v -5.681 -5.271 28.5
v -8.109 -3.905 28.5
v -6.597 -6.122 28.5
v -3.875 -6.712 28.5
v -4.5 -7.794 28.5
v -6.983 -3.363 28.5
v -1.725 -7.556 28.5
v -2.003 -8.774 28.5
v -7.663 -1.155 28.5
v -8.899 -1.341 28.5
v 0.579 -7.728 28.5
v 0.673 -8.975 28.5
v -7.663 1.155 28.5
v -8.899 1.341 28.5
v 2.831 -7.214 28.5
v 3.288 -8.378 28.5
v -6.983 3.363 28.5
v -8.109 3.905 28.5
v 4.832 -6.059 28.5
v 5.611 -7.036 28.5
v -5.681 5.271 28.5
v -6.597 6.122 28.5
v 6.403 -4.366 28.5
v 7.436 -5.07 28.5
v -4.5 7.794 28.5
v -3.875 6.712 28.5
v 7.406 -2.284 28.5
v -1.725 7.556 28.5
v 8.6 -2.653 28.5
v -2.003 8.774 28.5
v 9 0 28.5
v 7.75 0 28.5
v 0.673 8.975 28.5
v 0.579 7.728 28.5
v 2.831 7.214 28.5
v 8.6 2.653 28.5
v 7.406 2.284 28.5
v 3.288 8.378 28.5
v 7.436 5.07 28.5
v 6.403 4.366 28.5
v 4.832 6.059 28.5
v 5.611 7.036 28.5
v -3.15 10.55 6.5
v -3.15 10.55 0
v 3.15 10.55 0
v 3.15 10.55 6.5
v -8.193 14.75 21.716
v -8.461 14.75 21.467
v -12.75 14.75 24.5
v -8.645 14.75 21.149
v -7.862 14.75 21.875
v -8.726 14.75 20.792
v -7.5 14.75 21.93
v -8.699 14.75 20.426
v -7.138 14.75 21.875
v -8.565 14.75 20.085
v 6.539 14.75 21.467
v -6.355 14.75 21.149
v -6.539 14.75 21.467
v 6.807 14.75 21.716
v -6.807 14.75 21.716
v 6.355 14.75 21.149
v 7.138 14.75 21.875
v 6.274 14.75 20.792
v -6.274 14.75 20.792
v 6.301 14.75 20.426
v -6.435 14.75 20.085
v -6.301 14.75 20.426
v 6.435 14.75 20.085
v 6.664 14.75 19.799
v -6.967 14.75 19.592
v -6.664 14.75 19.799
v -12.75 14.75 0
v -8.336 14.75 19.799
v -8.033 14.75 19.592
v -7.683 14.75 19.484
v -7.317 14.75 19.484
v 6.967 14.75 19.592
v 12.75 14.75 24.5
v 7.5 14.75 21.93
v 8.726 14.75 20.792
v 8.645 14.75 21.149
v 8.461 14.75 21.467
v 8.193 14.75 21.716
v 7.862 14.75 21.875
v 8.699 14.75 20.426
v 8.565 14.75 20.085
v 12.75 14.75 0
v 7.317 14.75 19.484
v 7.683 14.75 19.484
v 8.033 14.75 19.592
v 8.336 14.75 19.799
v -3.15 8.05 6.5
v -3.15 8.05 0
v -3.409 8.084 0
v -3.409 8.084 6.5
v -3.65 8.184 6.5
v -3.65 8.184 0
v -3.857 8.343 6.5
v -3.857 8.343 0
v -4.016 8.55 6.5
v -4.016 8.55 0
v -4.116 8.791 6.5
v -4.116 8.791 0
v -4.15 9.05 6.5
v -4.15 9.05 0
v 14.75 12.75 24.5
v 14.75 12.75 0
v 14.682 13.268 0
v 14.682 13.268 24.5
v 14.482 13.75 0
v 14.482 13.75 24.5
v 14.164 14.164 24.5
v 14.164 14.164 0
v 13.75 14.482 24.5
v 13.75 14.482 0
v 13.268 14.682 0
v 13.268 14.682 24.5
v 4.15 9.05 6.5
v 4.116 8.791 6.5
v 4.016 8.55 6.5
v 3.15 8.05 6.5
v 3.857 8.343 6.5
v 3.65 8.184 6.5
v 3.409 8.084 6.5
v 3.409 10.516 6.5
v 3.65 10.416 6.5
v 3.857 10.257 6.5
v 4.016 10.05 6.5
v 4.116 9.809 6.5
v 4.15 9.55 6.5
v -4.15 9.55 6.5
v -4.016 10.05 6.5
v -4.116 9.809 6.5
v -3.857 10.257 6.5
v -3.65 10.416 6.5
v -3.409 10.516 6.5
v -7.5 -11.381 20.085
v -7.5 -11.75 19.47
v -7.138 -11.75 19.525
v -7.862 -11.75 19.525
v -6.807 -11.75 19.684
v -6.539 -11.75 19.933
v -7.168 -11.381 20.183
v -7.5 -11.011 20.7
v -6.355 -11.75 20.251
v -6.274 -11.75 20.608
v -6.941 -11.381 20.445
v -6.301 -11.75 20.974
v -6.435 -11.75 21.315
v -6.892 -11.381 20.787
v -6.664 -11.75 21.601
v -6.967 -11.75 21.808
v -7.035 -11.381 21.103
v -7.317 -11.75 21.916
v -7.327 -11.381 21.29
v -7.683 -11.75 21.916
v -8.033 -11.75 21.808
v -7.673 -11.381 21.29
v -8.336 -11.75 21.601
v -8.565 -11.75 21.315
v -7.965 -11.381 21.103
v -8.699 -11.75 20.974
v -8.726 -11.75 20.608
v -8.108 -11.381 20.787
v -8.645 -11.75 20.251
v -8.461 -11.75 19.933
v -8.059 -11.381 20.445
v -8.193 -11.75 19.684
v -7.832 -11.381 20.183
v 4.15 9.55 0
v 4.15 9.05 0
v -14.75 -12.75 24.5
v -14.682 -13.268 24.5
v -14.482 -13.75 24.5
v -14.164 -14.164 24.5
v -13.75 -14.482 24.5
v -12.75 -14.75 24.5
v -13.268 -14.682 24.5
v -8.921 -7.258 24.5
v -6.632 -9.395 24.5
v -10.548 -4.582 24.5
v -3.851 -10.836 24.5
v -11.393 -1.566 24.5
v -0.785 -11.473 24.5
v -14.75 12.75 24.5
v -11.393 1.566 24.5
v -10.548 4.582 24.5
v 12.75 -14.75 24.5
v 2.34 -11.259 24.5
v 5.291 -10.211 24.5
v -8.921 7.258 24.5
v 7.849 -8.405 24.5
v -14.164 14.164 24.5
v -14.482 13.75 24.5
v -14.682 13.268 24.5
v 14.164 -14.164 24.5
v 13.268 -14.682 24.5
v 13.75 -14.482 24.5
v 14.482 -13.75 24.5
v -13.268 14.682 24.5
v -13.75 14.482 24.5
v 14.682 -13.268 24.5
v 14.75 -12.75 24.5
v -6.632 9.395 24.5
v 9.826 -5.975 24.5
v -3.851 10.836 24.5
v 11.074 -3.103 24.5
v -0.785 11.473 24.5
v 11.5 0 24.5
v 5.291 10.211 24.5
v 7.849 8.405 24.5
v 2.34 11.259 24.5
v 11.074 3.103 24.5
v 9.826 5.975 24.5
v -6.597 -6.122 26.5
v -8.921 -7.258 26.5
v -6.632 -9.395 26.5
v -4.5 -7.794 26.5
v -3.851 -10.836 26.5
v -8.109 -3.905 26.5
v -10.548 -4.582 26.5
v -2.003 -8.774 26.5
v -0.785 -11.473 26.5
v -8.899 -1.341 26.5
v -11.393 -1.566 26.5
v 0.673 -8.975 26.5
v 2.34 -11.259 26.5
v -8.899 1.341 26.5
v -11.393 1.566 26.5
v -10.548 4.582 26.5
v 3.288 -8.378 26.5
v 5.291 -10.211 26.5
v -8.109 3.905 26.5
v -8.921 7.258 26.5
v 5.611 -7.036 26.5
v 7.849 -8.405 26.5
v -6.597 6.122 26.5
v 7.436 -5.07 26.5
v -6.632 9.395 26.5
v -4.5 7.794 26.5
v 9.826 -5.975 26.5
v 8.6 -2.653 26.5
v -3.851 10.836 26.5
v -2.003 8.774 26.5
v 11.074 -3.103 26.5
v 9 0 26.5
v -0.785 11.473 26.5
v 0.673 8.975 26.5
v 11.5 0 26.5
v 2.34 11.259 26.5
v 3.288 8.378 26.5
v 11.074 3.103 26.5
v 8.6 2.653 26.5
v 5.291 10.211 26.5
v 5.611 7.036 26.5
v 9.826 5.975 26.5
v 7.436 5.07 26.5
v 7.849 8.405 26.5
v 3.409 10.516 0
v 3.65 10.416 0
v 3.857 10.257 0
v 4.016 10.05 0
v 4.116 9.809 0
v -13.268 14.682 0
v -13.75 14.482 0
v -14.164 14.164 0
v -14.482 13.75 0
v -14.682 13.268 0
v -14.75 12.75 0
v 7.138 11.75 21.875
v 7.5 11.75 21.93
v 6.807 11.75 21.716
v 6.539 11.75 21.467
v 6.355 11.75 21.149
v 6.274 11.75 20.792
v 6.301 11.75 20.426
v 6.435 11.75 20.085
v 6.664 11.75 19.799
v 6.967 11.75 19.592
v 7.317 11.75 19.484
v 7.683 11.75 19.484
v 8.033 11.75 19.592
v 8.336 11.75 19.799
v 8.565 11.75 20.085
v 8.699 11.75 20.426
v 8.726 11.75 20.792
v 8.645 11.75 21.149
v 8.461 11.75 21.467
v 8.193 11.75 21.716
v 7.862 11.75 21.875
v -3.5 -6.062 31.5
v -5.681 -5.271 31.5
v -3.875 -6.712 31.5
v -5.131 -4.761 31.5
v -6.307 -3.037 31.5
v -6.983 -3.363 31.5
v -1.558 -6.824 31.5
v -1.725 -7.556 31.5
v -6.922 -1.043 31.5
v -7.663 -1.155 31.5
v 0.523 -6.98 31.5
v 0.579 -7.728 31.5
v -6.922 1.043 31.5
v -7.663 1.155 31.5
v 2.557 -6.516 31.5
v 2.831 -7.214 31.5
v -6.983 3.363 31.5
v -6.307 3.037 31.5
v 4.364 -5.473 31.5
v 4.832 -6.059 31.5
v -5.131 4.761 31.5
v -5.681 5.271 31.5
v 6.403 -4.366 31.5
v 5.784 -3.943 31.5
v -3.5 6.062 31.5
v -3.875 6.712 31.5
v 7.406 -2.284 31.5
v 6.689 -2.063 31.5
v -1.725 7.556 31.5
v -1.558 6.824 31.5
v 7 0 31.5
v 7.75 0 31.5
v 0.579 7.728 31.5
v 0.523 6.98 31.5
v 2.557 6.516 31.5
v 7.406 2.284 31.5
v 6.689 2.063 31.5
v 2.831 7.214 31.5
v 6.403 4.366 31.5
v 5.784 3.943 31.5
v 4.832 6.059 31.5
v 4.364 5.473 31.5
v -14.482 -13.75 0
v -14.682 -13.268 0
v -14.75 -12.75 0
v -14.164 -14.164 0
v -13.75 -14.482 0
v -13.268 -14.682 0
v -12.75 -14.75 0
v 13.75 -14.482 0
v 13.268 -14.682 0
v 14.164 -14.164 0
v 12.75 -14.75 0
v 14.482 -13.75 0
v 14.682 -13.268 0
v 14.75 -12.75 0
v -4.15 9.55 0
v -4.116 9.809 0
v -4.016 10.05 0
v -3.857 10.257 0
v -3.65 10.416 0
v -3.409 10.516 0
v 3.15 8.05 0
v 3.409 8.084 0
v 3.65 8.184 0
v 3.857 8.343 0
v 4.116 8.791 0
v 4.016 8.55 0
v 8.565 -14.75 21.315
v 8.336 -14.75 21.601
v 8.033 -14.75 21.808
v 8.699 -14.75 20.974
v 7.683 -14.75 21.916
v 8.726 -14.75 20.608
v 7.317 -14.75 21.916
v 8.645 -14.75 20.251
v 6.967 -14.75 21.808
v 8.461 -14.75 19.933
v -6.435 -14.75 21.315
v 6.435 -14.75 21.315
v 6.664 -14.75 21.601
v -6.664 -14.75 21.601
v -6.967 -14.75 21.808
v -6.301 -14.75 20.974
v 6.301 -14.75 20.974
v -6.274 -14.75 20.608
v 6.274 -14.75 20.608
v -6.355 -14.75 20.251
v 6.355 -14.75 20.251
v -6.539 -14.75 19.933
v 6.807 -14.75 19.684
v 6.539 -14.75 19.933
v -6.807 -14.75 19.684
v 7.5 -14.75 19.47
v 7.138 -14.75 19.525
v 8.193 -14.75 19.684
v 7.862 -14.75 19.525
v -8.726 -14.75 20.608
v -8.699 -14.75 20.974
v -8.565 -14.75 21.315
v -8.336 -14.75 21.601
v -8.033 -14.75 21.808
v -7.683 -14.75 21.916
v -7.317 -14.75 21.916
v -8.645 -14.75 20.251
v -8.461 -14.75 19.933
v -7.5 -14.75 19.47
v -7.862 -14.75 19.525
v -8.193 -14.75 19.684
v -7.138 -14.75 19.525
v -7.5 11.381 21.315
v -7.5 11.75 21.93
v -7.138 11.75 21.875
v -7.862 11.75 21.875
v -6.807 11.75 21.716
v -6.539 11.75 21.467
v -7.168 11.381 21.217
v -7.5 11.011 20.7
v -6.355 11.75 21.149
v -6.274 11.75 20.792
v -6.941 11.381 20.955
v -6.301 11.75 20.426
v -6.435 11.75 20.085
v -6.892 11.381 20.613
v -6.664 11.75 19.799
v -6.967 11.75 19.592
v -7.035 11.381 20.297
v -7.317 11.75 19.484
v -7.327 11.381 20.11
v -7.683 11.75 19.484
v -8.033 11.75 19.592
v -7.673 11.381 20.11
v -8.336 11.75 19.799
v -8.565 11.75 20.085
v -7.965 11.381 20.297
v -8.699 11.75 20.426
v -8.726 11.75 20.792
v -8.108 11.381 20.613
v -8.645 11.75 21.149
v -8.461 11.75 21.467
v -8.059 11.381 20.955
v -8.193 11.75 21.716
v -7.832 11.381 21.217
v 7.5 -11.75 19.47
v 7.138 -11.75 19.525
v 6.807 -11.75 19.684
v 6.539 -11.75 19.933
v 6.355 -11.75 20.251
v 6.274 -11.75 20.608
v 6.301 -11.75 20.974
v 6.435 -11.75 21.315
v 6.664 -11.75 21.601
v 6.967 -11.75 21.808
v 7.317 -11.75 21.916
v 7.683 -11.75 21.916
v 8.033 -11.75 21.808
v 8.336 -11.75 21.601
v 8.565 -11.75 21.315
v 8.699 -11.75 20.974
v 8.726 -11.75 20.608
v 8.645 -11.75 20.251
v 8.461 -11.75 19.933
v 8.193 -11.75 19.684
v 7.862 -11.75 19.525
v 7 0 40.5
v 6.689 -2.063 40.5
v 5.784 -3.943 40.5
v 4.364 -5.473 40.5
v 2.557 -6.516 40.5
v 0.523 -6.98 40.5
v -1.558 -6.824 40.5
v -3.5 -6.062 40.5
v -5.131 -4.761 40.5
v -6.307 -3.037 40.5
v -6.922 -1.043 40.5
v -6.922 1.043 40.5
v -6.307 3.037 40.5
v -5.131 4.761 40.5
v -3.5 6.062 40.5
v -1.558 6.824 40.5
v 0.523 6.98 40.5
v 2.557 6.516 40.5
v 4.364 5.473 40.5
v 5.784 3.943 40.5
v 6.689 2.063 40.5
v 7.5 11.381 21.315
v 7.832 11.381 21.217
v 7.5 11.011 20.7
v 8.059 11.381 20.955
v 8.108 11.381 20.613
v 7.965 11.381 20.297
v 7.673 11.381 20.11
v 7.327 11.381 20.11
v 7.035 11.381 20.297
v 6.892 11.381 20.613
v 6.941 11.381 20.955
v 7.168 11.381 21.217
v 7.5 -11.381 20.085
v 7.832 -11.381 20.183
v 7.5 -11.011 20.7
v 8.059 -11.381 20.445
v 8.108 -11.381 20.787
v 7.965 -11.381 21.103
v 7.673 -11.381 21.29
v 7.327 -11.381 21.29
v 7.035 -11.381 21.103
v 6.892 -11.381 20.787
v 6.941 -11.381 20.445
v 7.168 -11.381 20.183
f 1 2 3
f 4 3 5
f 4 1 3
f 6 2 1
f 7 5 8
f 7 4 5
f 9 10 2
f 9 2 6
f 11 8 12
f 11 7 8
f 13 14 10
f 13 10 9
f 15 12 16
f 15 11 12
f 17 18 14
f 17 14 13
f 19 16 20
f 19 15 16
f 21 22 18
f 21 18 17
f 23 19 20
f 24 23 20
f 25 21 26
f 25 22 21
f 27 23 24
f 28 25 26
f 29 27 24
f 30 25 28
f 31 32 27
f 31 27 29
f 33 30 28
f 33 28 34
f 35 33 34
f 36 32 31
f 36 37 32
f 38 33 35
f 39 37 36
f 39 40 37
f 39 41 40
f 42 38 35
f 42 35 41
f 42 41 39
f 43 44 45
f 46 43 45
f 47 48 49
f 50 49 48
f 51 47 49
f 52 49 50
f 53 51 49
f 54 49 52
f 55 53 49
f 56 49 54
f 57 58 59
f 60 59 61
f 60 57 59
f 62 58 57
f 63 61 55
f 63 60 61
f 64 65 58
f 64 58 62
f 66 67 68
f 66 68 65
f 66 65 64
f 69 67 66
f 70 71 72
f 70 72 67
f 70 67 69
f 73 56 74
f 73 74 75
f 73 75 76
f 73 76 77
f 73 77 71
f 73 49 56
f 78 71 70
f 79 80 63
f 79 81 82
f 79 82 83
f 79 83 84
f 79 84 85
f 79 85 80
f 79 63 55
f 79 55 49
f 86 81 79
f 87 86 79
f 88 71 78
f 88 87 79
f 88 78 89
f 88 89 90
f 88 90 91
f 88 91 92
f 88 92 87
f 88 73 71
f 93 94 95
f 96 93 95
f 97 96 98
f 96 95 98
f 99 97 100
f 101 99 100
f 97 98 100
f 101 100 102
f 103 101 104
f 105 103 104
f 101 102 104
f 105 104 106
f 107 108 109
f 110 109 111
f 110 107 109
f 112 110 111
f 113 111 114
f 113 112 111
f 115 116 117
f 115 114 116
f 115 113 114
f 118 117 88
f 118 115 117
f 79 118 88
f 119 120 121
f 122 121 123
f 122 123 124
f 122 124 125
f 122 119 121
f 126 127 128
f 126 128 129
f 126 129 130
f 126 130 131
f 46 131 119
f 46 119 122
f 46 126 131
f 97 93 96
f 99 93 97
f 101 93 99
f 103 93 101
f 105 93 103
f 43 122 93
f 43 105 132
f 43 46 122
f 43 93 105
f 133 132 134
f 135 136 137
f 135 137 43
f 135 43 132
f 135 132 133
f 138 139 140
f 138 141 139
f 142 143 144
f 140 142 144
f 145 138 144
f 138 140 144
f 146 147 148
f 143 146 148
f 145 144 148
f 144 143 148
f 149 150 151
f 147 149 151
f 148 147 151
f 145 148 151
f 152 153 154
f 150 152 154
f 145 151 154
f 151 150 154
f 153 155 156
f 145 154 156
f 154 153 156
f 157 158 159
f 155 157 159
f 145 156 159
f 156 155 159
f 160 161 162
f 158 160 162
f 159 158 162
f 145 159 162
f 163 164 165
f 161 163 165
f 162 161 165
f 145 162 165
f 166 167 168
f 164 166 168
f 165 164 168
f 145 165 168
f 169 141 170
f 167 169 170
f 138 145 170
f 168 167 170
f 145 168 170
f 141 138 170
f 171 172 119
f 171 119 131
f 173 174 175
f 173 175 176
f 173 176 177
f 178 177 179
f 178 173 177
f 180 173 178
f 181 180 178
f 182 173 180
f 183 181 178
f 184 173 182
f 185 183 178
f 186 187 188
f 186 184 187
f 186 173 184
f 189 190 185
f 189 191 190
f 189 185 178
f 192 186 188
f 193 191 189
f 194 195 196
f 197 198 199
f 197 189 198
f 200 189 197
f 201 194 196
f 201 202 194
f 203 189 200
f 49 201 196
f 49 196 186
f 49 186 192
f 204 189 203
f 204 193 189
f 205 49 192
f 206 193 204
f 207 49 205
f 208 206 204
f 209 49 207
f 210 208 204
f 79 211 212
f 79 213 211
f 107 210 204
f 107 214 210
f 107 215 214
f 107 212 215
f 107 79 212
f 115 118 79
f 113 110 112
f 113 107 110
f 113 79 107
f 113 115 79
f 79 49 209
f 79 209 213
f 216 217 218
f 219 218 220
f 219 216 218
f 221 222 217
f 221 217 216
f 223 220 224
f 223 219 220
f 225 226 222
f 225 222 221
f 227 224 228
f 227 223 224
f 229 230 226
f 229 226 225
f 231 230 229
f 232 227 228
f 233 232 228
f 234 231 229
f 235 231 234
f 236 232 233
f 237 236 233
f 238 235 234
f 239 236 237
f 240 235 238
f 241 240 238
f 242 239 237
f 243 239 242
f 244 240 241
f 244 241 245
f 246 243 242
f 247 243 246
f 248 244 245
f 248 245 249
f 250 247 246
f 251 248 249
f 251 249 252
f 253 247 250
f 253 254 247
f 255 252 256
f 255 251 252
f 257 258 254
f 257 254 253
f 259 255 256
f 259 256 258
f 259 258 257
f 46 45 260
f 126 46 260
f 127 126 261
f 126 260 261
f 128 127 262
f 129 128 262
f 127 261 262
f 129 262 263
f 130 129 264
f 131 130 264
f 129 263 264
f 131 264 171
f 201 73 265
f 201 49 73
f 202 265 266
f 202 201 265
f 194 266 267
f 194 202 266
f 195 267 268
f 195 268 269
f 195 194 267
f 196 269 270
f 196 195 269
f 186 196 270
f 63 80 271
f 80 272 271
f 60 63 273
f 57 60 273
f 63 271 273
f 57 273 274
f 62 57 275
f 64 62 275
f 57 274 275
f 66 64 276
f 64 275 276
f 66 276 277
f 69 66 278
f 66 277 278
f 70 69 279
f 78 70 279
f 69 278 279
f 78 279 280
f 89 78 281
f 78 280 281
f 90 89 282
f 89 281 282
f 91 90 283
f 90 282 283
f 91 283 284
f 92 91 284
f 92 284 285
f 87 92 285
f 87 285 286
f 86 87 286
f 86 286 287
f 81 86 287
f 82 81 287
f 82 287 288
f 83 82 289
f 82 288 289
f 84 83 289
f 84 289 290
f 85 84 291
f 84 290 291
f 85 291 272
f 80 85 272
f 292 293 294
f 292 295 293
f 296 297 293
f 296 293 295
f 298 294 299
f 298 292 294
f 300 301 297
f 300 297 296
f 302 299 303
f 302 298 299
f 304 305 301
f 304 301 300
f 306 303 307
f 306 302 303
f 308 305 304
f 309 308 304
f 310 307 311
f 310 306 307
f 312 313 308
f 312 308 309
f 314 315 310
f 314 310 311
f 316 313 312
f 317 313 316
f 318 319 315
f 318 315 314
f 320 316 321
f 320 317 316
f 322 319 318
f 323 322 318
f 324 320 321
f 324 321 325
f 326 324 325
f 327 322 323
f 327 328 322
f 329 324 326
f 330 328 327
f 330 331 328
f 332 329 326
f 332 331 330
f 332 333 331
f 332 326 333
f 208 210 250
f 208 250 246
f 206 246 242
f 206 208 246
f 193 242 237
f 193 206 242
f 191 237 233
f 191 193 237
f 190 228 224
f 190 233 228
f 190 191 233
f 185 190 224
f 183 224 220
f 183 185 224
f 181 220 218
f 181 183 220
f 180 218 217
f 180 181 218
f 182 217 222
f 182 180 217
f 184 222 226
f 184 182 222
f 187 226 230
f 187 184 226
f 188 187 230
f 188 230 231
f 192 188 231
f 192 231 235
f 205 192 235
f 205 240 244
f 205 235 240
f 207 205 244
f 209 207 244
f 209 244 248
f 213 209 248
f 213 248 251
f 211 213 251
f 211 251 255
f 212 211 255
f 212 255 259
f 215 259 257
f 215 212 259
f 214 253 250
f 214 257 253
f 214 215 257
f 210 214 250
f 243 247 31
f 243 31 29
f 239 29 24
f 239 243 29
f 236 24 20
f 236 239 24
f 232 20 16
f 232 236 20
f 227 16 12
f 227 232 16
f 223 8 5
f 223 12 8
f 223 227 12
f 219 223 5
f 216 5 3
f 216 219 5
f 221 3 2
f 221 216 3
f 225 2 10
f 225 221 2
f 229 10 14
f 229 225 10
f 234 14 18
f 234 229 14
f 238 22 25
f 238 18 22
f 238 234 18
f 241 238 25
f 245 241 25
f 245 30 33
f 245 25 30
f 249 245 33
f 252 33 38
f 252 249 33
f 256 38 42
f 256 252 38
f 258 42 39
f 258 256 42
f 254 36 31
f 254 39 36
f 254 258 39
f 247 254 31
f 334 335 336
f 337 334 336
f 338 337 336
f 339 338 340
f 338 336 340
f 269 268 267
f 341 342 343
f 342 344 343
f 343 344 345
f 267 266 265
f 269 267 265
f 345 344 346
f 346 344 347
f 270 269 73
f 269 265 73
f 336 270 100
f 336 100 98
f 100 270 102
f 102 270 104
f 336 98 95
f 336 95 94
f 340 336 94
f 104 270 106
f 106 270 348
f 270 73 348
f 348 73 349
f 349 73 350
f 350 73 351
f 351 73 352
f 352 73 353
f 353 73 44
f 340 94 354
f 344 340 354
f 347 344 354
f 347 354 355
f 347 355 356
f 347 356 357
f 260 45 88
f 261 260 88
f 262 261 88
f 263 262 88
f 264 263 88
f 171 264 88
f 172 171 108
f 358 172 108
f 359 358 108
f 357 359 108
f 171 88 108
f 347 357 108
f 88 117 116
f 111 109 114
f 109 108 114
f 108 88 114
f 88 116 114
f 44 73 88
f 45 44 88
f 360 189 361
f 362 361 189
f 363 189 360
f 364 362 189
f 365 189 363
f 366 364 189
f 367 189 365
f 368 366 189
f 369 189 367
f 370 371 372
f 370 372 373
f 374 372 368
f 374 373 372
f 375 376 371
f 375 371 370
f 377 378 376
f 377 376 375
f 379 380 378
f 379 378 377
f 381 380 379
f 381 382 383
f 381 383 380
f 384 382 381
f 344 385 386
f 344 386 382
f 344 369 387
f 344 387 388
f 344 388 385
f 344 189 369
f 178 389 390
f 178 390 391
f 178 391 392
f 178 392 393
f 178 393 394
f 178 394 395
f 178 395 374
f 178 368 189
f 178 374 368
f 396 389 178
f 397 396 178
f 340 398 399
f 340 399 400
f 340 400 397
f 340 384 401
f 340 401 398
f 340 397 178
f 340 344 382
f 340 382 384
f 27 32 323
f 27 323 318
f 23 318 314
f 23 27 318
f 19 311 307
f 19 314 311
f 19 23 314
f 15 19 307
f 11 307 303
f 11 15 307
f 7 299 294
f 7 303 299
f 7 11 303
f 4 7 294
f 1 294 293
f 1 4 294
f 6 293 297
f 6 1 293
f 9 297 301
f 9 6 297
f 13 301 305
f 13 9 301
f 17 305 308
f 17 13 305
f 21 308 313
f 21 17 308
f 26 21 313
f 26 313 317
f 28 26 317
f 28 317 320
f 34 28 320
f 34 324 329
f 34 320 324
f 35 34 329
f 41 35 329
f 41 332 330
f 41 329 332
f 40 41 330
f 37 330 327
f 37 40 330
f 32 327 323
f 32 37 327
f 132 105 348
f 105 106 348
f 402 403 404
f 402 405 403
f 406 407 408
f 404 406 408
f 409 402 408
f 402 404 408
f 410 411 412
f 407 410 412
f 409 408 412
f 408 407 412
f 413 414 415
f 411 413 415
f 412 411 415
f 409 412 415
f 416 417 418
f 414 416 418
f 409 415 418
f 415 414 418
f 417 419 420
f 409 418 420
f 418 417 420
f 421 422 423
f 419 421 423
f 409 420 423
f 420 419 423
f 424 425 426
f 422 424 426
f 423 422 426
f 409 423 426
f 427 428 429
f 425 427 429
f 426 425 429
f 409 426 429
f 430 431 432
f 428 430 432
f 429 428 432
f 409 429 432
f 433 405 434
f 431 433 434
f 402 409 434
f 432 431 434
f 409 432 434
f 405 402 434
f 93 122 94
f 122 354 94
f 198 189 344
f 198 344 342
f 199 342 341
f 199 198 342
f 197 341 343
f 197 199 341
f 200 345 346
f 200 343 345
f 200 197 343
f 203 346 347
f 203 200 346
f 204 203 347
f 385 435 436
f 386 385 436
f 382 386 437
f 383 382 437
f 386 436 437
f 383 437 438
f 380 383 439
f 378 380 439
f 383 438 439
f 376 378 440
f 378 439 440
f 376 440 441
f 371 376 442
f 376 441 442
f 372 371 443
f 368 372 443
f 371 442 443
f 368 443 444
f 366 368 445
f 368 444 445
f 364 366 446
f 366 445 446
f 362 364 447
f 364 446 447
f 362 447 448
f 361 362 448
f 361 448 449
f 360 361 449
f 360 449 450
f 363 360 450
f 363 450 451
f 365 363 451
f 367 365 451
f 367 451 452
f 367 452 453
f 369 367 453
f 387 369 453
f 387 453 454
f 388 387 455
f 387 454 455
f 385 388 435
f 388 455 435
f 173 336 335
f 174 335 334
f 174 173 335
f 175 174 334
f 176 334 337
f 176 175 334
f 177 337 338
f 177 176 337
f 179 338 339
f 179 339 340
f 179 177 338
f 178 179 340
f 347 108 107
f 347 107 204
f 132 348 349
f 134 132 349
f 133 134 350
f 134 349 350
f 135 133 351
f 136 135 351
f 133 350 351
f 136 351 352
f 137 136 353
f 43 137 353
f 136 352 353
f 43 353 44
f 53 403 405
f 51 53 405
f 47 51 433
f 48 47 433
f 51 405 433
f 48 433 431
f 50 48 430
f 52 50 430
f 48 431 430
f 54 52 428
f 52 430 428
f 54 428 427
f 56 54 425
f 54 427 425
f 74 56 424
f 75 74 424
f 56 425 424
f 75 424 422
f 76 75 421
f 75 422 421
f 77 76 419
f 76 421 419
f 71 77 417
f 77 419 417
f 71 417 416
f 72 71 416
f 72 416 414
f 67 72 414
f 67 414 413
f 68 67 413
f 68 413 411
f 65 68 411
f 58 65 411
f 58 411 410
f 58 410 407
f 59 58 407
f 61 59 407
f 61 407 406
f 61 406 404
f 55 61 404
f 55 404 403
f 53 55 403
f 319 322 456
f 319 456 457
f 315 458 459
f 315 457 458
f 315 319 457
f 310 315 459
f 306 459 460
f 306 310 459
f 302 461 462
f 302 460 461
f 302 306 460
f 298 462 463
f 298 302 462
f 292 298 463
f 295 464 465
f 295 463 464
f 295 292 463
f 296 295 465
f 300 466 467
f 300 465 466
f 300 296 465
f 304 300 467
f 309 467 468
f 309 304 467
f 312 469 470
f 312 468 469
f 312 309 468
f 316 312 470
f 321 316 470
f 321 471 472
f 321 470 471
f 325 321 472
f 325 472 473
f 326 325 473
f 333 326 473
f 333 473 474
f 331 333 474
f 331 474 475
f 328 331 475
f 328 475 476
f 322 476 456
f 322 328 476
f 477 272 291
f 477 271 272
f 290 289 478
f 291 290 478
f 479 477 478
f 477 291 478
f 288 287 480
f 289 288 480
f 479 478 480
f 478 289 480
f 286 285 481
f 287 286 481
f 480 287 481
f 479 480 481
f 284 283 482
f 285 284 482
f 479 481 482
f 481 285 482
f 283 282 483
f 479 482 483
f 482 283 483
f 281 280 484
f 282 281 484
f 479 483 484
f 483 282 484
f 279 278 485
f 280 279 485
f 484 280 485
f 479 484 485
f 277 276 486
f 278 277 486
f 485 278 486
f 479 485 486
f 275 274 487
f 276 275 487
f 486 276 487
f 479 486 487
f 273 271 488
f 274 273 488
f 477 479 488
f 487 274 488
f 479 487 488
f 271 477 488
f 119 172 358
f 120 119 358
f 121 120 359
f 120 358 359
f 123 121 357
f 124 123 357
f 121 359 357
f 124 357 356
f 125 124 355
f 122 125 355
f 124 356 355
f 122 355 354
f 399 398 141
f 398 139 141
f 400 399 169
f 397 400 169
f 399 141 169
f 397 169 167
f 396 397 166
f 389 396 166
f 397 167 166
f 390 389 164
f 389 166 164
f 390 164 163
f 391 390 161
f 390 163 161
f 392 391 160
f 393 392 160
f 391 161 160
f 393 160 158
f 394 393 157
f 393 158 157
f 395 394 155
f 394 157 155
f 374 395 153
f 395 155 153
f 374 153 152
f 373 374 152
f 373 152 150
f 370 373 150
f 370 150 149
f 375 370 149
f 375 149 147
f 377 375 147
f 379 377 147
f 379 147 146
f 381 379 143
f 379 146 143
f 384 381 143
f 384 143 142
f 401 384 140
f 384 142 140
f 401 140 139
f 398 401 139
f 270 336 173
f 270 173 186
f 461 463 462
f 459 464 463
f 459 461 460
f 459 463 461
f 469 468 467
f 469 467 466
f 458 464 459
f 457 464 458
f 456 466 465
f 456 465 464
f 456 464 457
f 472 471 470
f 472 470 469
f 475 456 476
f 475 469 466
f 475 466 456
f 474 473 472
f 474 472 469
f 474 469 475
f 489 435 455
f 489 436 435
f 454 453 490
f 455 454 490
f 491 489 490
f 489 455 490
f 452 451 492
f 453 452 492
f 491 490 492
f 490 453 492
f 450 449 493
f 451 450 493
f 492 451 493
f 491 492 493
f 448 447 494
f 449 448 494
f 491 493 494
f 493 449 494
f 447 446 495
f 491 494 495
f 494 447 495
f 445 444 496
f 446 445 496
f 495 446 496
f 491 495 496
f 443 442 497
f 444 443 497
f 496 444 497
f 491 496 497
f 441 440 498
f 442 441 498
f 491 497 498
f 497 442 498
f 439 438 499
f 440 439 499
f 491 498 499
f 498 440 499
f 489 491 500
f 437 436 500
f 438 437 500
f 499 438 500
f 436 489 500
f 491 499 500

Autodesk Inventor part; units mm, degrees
ref_plane "YZ Plane" through (0, 0, 0) normal (1, 0, 0) x (0, 1, 0)
ref_plane "XZ Plane" through (0, 0, 0) normal (0, 1, 0) x (-1, 0, 0)
ref_plane "XY Plane" through (0, 0, 0) normal (0, 0, 1) x (1, 0, 0)
sketch "Sketch1" plane through (0, 0, 0) normal (0, 0, 1) x (1, 0, 0)
  line L0 (-14.75, 14.75) -> (14.75, 14.75)
  line L1 (14.75, 14.75) -> (14.75, -14.75)
  line L2 (14.75, -14.75) -> (-14.75, -14.75)
  line L3 (-14.75, -14.75) -> (-14.75, 14.75)
  line L4 (0, 0) -> (0, 4.6825) construction
  line L5 (0, 0) -> (4.0135, 0) construction
  dimension "d0" = 29.5
  dimension "d1" = 29.5
extrude "Extrusion1" add sketch "Sketch1" along normal blind 24.5
sketch "Sketch2" plane through (0, 0, 24.5) normal (0, 0, 1) x (1, 0, 0)
  circle A0 centre (0, 0) radius 11.5
  dimension "d4" = 23
extrude "Extrusion2" add sketch "Sketch2" along normal blind 2
sketch "Sketch3" plane through (0, 0, 26.5) normal (0, 0, 1) x (1, 0, 0)
  circle A0 centre (0, 0) radius 9
  dimension "d7" = 18
extrude "Extrusion3" add sketch "Sketch3" along normal blind 2
sketch "Sketch4" plane through (0, 0, 28.5) normal (0, 0, 1) x (1, 0, 0)
  circle A0 centre (0, 0) radius 7.75
  dimension "d10" = 15.5
extrude "Extrusion4" add sketch "Sketch4" along normal blind 3
sketch "Sketch5" plane through (0, 0, 31.5) normal (0, 0, 1) x (1, 0, 0)
  circle A0 centre (0, 0) radius 7
  dimension "d13" = 14
extrude "Extrusion5" add sketch "Sketch5" along normal blind 9
sketch "Sketch6" plane through (-14.75, 14.75, 0) normal (0, 1, 0) x (1, 0, 0)
  line L0 (29.5, -24.5) -> (0, -24.5) projected
  line L1 (0, 0) -> (0, -24.5) projected
  point P0 (14.75, 0)
  point P1 (7.25, -20.7)
  point P2 (22.25, -20.7)
  dimension "d16" = 15
  dimension "d17" = 3.8
  dimension "d18" = 7.25
hole "Hole1" at (-7.5, 14.75, 20.7) at (7.5, 14.75, 20.7) direction (0, -1, 0) diameter 2.459 depth 3 tip angle 118 thread size "M3x0.5" class "6H" standard "ISO Metric profile"
fillet "Fillet1" radius 2 4 edges at (14.75, 14.75, 12.25) (-14.75, 14.75, 12.25) (-14.75, -14.75, 12.25) (14.75, -14.75, 12.25)
sketch "Sketch7" plane through (-12.75, -14.75, 0) normal (0, -1, 0) x (1, 0, 0)
  line L0 (0, 24.5) -> (25.5, 24.5) projected
  line L1 (-2, 24.5) -> (-2, 0) projected
  point P0 (12.75, 0)
  point P1 (5.25, 20.7)
  point P2 (20.25, 20.7)
  dimension "d27" = 15
  dimension "d28" = 3.8
  dimension "d29" = 7.25
hole "Hole2" at (-7.5, -14.75, 20.7) at (7.5, -14.75, 20.7) direction (0, 1, 0) diameter 2.459 depth 3 tip angle 118 thread size "M3x0.5" class "6H" standard "ISO Metric profile"
sketch "Sketch8" plane through (0, 0, 0) normal (0, 0, -1) x (-1, 0, 0)
  line L0 (5.0435, 9.3) -> (-5.0435, 9.3) construction
  line L1 (3.15, 10.55) -> (-3.15, 10.55)
  line L2 (-3.15, 8.05) -> (3.15, 8.05)
  line L3 (0, 0) -> (-20.3594, 0) construction
  line L4 (0, 0) -> (0, -6.0077) construction
  line L5 (4.15, 9.05) -> (4.15, 9.55)
  line L6 (-4.15, 9.05) -> (-4.15, 9.55)
  arc A0 (3.15, 8.05) -> (4.15, 9.05) centre (3.15, 9.05) ccw
  arc A1 (4.15, 9.55) -> (3.15, 10.55) centre (3.15, 9.55) ccw
  arc A2 (-3.15, 10.55) -> (-4.15, 9.55) centre (-3.15, 9.55) ccw
  arc A3 (-4.15, 9.05) -> (-3.15, 8.05) centre (-3.15, 9.05) ccw
  point P0 (-4.15, 8.05)
  point P1 (4.15, 8.05)
  point P2 (0, 9.3)
  point P3 (-4.15, 10.55)
  dimension "d37" = 9.3
  dimension "d38" = 8.3
  dimension "d39" = 2.5
  dimension "d41" = 1
extrude "Extrusion6" cut sketch "Sketch8" against normal blind 6.5
properties part number "3d_JacintoDevKit_Addon - Camera"
